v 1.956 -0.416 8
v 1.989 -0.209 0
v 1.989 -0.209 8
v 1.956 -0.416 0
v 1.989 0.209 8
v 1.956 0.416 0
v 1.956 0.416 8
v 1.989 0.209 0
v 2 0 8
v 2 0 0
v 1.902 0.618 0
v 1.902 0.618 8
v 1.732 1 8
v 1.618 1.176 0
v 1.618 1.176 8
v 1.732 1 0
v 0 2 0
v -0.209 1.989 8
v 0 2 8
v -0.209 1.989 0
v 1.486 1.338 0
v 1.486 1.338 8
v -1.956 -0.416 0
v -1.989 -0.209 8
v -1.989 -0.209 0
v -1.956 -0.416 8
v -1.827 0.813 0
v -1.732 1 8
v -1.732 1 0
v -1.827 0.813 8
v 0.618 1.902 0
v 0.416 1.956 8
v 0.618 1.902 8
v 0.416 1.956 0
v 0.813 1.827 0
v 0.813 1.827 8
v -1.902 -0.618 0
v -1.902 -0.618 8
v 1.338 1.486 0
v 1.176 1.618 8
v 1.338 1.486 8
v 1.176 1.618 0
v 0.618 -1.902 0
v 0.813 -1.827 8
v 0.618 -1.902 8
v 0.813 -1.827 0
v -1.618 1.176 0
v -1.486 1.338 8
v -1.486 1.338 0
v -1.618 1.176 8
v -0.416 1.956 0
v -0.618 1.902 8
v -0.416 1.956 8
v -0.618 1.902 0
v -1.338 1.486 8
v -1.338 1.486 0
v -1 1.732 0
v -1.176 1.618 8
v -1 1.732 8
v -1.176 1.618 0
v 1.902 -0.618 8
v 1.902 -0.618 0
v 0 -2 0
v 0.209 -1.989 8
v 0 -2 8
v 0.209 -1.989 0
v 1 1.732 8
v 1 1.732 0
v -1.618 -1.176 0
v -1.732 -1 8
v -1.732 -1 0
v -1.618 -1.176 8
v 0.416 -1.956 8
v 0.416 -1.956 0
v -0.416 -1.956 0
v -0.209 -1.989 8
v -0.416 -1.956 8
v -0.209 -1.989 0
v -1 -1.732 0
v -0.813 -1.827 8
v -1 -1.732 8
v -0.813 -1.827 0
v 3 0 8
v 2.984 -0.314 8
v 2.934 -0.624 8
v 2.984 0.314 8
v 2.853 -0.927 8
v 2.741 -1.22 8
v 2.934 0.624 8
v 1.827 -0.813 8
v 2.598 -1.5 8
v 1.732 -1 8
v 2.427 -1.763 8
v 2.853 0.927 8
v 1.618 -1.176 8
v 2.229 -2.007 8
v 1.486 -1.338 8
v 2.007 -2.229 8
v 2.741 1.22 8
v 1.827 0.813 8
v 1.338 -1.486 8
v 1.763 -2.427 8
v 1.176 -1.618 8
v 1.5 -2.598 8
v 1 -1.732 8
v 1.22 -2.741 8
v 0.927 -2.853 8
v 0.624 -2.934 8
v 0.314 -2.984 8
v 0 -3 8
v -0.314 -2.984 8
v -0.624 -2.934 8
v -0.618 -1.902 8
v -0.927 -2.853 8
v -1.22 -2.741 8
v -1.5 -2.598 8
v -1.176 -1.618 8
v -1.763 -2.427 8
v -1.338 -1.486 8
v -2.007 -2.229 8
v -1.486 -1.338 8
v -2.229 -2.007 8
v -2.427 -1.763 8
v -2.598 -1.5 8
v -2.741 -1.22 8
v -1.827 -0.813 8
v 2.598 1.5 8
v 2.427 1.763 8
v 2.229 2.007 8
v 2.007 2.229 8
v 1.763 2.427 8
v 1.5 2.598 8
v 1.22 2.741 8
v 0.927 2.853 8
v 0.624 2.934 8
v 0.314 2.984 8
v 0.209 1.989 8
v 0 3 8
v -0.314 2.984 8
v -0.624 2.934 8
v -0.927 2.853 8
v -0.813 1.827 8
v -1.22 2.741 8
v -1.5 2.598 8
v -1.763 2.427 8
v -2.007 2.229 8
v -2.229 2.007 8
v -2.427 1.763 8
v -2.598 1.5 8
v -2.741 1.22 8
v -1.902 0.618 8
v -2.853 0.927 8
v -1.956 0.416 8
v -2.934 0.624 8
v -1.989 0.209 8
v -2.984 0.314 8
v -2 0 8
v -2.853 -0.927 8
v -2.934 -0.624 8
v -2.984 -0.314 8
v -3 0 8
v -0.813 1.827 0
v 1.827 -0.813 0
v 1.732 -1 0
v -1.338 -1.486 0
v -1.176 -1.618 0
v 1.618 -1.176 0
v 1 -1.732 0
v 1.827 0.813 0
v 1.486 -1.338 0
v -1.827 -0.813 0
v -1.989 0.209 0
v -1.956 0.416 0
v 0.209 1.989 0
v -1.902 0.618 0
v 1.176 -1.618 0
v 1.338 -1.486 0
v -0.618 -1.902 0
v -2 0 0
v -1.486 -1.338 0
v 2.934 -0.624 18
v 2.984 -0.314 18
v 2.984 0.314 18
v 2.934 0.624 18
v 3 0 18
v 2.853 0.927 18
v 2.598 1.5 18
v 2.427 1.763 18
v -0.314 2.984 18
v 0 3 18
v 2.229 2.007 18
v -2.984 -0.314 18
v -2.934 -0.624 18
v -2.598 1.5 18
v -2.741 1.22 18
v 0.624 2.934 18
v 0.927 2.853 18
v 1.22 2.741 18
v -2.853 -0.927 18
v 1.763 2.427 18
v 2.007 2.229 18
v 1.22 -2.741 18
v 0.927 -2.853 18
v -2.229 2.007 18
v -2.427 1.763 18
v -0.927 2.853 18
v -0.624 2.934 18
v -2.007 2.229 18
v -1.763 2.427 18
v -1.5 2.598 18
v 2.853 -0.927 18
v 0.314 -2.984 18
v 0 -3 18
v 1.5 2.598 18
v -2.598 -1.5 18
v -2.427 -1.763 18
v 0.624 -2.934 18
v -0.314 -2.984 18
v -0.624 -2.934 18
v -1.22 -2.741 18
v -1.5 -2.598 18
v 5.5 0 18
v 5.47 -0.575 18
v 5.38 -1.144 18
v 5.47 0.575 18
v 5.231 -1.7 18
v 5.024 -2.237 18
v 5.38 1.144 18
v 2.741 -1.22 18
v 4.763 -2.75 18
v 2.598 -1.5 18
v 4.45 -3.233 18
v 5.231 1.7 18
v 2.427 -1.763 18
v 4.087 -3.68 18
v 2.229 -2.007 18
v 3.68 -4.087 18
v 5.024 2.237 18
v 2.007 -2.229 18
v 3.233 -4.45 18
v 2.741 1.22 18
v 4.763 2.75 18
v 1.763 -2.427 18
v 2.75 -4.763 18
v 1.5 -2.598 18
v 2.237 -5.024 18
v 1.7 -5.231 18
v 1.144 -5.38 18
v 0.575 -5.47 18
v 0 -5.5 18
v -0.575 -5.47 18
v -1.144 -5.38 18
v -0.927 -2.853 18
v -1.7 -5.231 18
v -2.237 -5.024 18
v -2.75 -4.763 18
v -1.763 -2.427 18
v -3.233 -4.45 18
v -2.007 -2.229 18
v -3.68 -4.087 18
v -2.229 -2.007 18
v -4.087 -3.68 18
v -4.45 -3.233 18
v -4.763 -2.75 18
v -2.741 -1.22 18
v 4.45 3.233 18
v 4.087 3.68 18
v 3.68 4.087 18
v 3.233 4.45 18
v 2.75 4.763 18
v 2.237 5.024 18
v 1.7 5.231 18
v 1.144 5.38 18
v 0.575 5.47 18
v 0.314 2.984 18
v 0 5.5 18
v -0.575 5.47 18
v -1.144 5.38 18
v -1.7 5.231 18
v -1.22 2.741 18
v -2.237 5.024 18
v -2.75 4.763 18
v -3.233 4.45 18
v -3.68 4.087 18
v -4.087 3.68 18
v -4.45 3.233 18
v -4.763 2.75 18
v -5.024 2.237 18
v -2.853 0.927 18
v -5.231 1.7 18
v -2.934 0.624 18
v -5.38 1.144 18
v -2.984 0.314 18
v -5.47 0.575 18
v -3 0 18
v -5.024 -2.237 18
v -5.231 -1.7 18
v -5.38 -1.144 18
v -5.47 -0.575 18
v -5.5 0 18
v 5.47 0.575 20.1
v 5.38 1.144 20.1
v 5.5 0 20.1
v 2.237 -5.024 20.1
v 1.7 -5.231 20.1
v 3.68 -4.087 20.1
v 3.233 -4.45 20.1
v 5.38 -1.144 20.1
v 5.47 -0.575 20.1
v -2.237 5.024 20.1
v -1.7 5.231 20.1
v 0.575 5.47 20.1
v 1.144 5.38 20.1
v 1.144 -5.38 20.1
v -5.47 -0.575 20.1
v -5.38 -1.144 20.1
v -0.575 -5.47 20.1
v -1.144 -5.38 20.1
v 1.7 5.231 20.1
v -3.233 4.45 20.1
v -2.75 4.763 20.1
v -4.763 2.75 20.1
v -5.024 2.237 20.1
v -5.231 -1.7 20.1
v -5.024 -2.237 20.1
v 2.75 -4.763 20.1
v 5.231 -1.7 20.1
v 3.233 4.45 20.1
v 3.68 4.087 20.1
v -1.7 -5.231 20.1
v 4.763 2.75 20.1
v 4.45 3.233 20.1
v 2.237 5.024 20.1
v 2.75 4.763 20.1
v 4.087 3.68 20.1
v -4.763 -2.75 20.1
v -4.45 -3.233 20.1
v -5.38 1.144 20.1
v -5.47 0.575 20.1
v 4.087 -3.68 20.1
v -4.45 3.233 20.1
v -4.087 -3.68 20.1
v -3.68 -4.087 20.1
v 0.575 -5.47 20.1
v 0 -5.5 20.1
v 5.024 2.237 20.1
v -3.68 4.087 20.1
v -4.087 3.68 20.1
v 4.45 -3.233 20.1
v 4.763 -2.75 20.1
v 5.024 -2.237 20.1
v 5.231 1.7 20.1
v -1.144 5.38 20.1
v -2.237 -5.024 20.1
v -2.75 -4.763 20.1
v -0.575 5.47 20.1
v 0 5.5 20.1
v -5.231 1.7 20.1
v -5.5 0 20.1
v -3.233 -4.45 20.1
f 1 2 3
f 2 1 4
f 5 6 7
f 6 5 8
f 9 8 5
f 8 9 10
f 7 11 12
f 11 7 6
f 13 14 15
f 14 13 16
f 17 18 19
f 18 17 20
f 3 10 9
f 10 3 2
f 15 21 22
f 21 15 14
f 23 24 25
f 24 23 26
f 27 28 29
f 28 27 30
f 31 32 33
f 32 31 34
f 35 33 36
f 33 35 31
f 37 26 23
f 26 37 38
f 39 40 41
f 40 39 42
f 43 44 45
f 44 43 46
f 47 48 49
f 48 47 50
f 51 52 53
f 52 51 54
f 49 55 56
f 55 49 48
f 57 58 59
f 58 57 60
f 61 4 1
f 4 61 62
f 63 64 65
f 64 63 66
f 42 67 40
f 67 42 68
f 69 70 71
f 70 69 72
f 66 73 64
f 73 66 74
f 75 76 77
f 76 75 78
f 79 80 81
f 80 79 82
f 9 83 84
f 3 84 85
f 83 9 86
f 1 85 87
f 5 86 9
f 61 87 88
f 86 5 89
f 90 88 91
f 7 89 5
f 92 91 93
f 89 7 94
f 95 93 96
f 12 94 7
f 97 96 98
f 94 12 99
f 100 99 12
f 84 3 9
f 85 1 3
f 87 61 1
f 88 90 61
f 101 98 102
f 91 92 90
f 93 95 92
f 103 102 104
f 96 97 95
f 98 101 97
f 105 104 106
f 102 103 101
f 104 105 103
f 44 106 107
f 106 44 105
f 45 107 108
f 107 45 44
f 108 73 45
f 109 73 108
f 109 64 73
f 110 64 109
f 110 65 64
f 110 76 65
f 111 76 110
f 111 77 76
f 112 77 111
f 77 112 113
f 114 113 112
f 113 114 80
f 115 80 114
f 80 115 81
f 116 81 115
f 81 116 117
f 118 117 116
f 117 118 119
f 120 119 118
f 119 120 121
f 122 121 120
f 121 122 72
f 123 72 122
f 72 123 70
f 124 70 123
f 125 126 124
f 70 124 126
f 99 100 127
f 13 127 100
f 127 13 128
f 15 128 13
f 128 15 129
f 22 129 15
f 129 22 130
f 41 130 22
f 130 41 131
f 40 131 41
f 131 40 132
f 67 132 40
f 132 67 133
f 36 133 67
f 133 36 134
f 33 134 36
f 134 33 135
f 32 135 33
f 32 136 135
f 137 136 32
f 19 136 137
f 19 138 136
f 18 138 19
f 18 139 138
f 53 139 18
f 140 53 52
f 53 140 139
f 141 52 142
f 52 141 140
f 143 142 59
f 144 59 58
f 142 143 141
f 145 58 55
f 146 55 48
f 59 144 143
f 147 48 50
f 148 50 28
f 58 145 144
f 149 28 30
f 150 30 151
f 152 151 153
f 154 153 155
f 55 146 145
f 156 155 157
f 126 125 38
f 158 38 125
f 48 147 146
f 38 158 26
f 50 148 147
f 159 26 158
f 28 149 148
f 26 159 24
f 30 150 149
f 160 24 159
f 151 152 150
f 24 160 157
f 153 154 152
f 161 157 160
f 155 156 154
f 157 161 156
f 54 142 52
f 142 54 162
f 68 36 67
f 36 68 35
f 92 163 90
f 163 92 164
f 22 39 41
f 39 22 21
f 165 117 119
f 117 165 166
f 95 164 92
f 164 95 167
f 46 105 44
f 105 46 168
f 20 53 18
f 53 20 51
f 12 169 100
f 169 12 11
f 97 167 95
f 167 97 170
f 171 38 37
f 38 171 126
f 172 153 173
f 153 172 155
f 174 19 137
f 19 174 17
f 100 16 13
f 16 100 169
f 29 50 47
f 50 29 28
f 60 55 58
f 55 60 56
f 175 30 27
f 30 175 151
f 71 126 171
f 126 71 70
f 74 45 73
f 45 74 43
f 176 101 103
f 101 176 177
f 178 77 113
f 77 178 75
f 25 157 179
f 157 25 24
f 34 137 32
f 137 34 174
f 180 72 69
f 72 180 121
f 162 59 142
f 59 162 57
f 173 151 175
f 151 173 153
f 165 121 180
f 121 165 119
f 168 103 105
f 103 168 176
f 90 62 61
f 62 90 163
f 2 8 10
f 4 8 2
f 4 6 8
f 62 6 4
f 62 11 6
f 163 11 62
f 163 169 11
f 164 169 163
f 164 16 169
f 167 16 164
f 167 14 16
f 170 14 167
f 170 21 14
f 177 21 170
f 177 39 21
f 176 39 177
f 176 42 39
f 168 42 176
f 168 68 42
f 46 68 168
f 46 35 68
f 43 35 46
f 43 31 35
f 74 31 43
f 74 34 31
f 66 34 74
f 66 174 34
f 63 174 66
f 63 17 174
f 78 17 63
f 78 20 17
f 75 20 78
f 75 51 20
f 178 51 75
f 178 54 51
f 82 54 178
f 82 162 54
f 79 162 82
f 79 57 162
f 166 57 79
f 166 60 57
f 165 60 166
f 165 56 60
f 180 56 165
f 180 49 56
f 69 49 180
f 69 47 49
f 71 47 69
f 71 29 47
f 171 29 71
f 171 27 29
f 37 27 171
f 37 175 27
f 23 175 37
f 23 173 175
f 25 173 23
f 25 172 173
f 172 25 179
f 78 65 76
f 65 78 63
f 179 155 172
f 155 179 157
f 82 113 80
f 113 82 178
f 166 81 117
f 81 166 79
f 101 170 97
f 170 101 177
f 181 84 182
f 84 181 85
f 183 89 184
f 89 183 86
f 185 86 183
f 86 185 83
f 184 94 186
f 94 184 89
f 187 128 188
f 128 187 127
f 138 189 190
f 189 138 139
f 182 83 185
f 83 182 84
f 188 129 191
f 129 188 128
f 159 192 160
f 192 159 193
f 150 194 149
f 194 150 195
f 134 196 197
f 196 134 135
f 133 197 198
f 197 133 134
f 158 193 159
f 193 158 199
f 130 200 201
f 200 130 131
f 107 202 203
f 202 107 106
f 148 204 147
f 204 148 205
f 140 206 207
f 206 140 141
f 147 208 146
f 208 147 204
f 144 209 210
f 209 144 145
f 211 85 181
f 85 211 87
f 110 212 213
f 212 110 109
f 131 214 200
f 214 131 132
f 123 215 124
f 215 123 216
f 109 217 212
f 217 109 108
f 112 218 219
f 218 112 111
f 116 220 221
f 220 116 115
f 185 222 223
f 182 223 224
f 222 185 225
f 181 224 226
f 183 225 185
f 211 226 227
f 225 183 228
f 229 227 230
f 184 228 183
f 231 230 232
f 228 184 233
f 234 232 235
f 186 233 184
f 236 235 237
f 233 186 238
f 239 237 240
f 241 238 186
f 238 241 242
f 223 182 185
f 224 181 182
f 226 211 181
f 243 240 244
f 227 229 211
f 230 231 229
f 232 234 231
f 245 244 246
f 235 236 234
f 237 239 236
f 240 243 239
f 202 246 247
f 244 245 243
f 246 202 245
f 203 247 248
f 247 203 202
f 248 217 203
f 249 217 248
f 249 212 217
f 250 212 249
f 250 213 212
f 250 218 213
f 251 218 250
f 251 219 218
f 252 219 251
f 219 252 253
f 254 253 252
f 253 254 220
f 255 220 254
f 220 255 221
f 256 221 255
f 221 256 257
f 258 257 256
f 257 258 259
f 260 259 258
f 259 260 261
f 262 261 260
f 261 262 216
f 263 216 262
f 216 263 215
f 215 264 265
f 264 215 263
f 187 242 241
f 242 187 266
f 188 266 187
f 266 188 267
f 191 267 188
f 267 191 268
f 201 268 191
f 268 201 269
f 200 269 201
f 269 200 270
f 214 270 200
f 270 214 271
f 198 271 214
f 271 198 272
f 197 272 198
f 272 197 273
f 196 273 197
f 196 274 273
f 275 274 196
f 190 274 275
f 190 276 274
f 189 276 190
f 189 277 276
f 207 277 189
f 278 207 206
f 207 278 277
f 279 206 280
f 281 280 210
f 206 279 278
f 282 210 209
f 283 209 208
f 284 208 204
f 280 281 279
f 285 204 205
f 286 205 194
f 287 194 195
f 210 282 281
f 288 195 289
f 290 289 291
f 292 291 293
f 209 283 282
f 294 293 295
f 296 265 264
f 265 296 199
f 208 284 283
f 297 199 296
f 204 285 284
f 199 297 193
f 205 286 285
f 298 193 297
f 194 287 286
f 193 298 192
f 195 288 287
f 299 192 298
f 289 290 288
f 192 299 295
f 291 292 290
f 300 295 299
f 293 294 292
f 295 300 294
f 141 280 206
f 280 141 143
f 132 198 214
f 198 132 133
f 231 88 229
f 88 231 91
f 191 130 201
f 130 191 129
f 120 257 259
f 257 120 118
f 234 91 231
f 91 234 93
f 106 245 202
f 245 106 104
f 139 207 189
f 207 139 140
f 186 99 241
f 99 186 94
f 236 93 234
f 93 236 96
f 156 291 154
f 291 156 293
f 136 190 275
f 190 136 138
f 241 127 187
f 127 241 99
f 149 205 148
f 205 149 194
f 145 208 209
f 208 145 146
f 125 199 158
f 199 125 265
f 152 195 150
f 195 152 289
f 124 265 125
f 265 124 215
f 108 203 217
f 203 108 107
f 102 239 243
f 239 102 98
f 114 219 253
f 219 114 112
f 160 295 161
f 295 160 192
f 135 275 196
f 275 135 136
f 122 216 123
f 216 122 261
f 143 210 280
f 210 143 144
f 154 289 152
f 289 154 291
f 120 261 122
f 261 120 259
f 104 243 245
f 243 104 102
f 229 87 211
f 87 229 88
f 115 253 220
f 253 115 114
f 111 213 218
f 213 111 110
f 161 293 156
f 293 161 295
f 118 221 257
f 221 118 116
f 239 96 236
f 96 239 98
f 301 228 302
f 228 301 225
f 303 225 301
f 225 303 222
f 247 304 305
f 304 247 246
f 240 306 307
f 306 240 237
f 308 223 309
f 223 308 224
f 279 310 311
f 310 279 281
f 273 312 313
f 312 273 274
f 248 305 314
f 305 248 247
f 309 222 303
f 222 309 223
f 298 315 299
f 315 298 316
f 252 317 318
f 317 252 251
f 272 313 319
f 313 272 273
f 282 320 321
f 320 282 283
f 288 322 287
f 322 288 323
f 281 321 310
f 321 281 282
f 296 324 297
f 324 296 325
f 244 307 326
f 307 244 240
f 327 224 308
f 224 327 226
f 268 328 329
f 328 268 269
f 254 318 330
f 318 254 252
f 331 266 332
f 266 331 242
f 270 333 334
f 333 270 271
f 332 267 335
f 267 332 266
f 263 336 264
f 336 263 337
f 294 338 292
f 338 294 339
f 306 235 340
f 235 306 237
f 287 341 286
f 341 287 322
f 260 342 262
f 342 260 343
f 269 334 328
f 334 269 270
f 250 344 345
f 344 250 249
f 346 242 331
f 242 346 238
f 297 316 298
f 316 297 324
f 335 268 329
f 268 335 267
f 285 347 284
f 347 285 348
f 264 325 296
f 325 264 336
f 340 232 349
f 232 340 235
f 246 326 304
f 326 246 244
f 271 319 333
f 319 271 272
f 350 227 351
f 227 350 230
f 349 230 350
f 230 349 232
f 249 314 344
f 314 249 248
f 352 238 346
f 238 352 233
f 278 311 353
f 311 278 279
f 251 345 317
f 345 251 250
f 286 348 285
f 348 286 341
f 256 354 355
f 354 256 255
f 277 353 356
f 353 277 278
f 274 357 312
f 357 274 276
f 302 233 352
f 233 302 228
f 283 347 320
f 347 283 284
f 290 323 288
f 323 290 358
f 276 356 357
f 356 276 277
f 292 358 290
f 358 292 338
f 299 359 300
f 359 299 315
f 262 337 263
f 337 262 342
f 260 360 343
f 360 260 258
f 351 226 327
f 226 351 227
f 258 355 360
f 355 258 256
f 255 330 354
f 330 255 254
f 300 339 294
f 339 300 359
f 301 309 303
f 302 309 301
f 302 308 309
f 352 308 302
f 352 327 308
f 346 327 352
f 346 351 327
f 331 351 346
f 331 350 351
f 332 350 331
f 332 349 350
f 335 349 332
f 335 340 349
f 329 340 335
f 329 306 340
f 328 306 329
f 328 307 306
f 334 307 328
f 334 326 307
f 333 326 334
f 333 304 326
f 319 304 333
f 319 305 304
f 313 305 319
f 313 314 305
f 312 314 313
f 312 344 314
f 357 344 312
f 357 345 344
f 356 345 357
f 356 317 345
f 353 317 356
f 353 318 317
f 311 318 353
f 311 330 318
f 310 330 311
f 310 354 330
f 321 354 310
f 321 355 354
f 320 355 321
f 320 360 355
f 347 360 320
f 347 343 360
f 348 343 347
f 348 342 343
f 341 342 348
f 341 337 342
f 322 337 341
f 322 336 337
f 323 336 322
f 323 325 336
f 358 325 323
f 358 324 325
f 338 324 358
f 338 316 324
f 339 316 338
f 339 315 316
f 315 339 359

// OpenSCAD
// Shoulder bolt.
$fn = 60;
eps = 0.02;
thread_d = 4;
shoulder_d = 6;
shoulder_l = 10;
thread_l = 8;
head_d = shoulder_d + 5;
union() {
    cylinder(d=thread_d,h=thread_l);
    translate([0,0,thread_l]) cylinder(d=shoulder_d,h=shoulder_l);
    translate([0,0,thread_l+shoulder_l]) cylinder(d=head_d,h=shoulder_d*0.35);
}
